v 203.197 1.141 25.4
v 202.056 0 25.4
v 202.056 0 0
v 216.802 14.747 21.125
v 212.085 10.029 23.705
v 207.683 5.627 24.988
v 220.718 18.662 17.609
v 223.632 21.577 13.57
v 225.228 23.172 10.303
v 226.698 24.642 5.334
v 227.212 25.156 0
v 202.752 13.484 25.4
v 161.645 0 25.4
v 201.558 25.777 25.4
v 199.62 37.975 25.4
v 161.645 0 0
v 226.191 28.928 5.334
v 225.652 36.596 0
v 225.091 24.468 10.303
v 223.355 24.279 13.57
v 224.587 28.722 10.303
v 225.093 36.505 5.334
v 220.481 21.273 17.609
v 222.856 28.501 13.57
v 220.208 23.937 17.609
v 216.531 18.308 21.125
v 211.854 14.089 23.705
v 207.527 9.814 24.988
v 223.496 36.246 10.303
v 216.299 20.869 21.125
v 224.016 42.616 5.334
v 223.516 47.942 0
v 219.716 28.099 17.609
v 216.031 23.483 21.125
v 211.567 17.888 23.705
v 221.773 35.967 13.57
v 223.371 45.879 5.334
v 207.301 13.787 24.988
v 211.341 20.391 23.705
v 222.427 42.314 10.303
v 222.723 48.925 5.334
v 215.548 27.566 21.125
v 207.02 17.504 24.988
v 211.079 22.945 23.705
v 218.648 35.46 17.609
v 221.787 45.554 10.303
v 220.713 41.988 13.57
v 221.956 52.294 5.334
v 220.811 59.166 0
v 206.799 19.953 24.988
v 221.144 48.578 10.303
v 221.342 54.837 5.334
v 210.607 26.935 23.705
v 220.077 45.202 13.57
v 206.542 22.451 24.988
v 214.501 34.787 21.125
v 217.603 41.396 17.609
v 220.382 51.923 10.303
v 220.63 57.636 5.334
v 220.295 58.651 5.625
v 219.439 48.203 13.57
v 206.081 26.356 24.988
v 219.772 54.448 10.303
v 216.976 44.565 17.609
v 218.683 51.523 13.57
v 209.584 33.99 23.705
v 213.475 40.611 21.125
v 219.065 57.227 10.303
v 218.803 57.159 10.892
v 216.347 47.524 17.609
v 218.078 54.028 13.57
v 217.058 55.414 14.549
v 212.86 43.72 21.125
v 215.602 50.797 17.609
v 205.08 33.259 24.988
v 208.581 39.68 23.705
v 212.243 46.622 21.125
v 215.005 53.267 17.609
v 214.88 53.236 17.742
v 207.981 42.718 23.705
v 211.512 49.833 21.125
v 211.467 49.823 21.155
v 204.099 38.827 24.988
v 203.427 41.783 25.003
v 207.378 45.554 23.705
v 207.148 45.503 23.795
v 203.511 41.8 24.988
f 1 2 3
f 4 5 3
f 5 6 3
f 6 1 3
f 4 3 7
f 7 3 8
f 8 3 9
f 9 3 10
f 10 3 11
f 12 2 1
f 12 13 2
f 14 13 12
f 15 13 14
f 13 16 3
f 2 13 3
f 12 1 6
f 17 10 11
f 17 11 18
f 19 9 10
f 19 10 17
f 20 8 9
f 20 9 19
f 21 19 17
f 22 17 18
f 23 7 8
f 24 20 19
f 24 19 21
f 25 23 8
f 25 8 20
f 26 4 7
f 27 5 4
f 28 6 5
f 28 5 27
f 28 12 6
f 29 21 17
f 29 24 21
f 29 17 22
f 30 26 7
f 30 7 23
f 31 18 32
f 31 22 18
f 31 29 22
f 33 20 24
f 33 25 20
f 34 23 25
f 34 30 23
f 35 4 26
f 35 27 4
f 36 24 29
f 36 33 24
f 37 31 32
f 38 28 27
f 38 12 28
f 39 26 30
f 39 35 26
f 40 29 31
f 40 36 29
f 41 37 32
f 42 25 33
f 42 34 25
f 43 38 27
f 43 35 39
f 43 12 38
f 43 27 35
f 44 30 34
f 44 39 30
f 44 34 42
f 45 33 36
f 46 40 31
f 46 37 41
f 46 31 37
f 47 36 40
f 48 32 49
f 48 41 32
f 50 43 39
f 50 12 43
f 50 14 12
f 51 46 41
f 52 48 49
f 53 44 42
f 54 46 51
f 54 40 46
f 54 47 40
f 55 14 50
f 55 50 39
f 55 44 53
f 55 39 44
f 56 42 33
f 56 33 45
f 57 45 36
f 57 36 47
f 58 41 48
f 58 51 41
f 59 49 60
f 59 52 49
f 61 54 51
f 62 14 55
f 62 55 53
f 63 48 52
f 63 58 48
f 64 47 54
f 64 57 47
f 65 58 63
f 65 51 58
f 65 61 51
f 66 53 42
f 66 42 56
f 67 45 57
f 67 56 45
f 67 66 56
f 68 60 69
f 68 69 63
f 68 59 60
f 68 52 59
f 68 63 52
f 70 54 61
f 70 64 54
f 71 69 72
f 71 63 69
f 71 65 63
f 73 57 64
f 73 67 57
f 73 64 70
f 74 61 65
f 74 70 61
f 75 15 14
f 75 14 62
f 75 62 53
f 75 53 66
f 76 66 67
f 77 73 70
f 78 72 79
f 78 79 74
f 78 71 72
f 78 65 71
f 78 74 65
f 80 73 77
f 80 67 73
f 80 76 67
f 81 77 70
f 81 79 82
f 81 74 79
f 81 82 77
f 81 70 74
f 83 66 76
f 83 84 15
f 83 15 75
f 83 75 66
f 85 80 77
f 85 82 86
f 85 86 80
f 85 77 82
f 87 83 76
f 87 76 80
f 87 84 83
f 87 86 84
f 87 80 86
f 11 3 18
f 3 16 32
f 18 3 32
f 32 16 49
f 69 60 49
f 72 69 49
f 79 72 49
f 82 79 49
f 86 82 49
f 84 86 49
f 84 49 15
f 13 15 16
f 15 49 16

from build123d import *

# Parameters (mm, degrees)
F2_DEPTH = 25.4
F3_R     = 25.39999


# Not quite as in the source:
# - a fillet or chamfer is up to 0.001 mm smaller than in the source, because OpenCascade refuses the exact size


with BuildPart() as f2:
    # F1 (on face) → F2 (new body)
    with BuildSketch(Plane.XY):
        with BuildLine():
            Line((161.6446101792, 0), (202.0557627241, 0))
            Line((202.0557627241, 0), (227.2116647397, 25.1559020156))
            ThreePointArc((227.2116647397, 25.1559020156), (224.6556687953, 42.28227144), (220.8106438897, 59.1660337104))
            Line((220.8106438897, 59.1660337104), (161.6446101792, 0))
        make_face()
    extrude(amount=F2_DEPTH)

    # F3 (radius 25.4 in the source; OpenCascade refuses exactly that, so slightly less here)
    f3_edges = [f2.edges().sort_by_distance(p)[0] for p in [
        (224.655669, 42.282271, 25.4),
    ]]
    fillet(f3_edges, radius=F3_R)


solid = f2.part
